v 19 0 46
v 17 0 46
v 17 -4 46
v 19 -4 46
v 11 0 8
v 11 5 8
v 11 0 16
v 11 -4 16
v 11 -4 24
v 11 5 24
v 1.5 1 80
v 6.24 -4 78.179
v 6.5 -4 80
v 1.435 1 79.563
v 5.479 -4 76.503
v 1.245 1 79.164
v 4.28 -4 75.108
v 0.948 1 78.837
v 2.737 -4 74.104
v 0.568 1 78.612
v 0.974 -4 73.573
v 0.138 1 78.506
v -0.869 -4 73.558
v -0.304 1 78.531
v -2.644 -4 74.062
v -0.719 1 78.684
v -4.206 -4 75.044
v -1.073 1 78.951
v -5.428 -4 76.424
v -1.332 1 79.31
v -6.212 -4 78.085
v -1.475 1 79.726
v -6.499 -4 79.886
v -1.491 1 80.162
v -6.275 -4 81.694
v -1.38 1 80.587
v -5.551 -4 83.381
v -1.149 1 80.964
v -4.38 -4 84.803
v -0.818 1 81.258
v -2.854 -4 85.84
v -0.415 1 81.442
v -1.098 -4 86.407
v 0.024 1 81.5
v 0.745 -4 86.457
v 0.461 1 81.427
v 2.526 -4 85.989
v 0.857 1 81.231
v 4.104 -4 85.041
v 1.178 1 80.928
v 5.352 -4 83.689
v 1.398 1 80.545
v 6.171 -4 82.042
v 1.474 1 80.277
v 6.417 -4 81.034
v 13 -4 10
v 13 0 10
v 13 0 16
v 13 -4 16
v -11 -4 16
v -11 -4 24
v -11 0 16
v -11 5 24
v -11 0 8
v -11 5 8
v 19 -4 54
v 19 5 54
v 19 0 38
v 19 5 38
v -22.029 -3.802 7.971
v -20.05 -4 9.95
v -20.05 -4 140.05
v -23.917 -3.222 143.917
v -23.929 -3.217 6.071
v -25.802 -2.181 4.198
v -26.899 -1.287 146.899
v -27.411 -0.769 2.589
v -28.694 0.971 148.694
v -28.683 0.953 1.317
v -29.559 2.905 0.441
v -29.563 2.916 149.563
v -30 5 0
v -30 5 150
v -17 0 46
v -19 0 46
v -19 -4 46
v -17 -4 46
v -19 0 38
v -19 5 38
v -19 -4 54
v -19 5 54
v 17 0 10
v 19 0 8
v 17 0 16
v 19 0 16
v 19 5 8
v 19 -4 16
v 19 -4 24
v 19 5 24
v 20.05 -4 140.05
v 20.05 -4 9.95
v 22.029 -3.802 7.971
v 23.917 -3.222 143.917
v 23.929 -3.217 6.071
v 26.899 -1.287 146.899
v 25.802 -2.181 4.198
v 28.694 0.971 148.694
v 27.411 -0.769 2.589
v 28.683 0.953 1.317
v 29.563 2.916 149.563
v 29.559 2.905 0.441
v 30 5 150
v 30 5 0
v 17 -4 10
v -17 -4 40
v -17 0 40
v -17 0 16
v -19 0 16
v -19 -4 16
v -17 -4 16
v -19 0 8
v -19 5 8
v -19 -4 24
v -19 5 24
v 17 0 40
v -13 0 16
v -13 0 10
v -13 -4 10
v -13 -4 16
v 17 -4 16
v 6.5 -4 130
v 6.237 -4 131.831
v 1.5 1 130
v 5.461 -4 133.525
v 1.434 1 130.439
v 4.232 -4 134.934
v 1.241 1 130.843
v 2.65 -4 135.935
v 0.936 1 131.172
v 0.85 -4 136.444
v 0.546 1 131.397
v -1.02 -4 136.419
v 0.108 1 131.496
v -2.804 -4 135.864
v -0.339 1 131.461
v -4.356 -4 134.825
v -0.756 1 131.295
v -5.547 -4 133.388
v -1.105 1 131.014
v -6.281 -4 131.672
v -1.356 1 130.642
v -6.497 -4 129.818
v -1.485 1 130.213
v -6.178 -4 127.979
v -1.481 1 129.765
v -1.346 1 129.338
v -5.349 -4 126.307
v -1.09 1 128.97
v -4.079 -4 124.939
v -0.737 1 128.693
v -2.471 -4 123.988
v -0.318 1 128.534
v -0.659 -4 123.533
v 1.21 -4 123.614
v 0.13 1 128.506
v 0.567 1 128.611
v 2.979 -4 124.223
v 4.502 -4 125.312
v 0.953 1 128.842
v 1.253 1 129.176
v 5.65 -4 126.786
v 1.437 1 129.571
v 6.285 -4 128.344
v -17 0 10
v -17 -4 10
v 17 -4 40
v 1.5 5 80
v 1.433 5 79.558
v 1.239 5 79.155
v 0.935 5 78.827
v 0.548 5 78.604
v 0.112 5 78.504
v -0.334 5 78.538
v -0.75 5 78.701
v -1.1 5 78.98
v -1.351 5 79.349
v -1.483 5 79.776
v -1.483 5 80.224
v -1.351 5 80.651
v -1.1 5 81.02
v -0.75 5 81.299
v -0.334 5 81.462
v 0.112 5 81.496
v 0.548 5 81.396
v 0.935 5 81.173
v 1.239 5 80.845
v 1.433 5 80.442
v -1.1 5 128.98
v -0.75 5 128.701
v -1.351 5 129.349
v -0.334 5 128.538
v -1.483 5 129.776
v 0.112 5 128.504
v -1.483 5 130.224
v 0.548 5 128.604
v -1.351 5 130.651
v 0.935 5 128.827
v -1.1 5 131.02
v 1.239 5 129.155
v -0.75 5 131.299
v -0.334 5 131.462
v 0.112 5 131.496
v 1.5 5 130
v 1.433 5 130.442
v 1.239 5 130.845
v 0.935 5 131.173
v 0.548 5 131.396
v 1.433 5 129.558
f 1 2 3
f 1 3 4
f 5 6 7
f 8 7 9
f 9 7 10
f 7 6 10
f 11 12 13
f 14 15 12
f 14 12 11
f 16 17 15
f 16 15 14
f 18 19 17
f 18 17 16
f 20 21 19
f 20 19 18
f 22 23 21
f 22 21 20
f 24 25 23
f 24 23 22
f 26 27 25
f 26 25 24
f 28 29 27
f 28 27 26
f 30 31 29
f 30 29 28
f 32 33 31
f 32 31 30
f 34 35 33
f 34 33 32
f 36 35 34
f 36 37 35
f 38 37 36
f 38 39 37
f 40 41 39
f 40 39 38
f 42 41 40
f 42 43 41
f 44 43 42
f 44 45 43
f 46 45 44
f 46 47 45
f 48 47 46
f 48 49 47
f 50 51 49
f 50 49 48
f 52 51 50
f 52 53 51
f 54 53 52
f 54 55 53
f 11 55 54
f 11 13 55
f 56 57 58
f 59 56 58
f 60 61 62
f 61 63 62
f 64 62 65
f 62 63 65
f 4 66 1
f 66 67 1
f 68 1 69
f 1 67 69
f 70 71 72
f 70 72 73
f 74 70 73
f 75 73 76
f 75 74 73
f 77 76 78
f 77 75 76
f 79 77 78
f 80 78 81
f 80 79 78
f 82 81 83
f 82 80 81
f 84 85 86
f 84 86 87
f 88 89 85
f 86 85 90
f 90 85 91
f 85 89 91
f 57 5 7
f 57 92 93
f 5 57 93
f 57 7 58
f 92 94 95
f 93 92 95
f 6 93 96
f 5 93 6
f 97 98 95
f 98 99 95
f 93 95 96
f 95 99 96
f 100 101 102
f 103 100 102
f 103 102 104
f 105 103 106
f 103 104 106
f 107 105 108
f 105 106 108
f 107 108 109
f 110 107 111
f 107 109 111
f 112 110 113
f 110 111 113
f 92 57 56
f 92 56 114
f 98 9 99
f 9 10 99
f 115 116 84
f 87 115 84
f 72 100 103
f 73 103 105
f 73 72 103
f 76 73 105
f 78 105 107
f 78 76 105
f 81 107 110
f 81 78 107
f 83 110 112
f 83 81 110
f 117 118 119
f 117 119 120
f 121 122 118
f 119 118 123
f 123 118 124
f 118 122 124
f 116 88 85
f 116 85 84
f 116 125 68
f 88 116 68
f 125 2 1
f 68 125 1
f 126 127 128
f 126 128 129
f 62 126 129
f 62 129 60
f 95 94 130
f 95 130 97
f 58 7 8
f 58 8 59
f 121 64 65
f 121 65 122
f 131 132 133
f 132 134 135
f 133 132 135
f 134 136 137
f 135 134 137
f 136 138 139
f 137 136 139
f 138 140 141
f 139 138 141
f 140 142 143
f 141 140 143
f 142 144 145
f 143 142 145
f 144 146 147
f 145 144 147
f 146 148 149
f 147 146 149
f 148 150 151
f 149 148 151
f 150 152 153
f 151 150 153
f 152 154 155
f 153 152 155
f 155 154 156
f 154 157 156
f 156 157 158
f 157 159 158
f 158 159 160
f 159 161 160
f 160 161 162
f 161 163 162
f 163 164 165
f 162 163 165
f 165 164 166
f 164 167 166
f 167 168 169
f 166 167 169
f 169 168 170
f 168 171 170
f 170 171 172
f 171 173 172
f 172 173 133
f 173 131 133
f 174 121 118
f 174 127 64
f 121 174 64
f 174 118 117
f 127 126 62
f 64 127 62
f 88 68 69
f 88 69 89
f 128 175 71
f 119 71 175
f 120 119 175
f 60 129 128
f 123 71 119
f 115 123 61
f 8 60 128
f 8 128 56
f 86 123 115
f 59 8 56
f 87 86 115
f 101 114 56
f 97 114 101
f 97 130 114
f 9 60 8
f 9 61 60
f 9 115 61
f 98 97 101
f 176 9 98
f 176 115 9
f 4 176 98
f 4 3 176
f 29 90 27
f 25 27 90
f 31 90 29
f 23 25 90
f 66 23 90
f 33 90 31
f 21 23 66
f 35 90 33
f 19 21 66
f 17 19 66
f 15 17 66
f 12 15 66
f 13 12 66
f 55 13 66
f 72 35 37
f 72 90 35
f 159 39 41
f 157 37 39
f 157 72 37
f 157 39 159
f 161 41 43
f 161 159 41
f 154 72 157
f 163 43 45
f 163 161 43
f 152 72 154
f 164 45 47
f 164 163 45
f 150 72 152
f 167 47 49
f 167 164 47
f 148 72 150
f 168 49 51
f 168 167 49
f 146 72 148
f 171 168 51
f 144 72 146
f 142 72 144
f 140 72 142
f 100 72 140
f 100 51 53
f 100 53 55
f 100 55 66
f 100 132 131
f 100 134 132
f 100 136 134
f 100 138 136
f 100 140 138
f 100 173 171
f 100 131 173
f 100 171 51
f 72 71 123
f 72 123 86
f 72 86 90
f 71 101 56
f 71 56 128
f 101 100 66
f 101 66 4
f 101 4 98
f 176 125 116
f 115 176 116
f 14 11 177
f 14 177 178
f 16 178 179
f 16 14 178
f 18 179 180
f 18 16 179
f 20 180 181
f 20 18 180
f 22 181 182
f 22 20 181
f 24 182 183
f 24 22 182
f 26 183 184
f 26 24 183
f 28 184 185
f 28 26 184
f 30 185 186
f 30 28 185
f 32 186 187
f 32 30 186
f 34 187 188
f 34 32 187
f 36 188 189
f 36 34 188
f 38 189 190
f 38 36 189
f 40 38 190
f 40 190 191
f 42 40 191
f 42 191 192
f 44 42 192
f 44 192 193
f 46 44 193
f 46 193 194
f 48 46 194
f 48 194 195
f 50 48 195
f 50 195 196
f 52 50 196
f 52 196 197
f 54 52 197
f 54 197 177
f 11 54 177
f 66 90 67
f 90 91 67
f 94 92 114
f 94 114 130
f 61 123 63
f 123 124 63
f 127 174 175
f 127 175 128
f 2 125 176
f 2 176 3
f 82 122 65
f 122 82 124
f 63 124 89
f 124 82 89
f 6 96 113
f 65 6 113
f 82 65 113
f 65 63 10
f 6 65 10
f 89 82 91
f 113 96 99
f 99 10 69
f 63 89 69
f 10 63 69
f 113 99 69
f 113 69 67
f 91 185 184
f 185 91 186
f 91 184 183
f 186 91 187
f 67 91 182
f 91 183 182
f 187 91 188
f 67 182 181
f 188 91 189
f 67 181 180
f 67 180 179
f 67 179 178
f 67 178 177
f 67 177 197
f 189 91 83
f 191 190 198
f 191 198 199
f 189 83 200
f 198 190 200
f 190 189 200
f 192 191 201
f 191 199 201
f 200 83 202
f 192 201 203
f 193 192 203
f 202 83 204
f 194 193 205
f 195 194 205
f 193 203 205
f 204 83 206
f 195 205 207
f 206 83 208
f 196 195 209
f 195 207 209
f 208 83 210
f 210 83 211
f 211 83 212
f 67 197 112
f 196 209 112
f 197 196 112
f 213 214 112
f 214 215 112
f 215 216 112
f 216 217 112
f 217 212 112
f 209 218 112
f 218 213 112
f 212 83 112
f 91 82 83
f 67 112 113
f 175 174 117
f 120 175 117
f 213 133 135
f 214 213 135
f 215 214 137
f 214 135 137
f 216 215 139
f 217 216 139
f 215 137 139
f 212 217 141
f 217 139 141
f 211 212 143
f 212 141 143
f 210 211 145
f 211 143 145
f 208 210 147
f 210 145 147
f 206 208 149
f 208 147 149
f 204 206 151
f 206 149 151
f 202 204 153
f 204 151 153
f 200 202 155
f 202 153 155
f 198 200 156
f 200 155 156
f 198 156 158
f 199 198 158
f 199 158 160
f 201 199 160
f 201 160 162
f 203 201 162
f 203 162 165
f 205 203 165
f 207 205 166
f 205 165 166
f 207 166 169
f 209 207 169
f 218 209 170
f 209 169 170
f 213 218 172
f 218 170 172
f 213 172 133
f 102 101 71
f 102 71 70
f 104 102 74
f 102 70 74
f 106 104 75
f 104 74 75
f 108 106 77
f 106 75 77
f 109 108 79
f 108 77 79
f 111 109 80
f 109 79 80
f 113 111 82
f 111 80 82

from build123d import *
from build123d import SkipClean  # not in build123d's __all__

# Parameters (mm, degrees)
F0_R        = 1.5
F1_DEPTH    = 5
F0_W        = 22
F0_H        = 2
F0_W_2      = 2
F0_H_2      = 6
F0_W_3      = 4
F2_DEPTH    = 4
F3_SIZE     = 5
F4_T1_DEPTH = 109.7493718553
F4_T3_DEPTH = 199.7493718553


# Not quite as in the source:
# - a fillet or chamfer that OpenCascade refuses, or shapes differently, is made with other operations: its cross-section is extruded or revolved along the edge and cut away or added
# - a feature names something its author has since deleted; it is built from what else it names


with BuildPart() as f1:
    # F0 (on Front) → F1 (new body)
    with BuildSketch(Plane.XZ):
        with BuildLine():
            Line((-30, 150), (-30, 80))
            Line((-30, 80), (-1.5, 80))
            ThreePointArc((-1.5, 80), (0, 81.5), (1.5, 80))
            Line((1.5, 80), (30, 80))
            Line((30, 80), (30, 150))
            Line((30, 150), (-30, 150))
        make_face()
        with Locations((0, 130)):
            Circle(F0_R, mode=Mode.SUBTRACT)
        with BuildLine():
            Line((-30, 0), (0, 0))
            Line((0, 0), (30, 0))
            Line((30, 0), (30, 80))
            Line((30, 80), (1.5, 80))
            ThreePointArc((1.5, 80), (0, 78.5), (-1.5, 80))
            Line((-1.5, 80), (-30, 80))
            Line((-30, 80), (-30, 0))
        make_face()
        Polygon((-11, 24), (-11, 16), (-11, 10), (-11, 8), (-13, 8), (-17, 8), (-19, 8), (-19, 10), (-19, 16), (-19, 24), align=None, mode=Mode.SUBTRACT)
        Polygon((19, 24), (19, 16), (19, 10), (19, 8), (17, 8), (13, 8), (11, 8), (11, 10), (11, 16), (11, 24), align=None, mode=Mode.SUBTRACT)
        Polygon((-19, 54), (-11, 54), (11, 54), (19, 54), (19, 46), (19, 40), (19, 38), (17, 38), (13, 38), (11, 38), (-11, 38), (-13, 38), (-17, 38), (-19, 38), (-19, 40), (-19, 46), (-19, 48), align=None, mode=Mode.SUBTRACT)
    extrude(amount=-F1_DEPTH)

    # F0 (on Front) → F2 (join)
    with BuildSketch(Plane.XZ):
        with BuildLine():
            Line((-30, 0), (0, 0))
            Line((0, 0), (30, 0))
            Line((30, 0), (30, 80))
            Line((30, 80), (1.5, 80))
            ThreePointArc((1.5, 80), (0, 78.5), (-1.5, 80))
            Line((-1.5, 80), (-30, 80))
            Line((-30, 80), (-30, 0))
        make_face()
        Polygon((-11, 24), (-11, 16), (-11, 10), (-11, 8), (-13, 8), (-17, 8), (-19, 8), (-19, 10), (-19, 16), (-19, 24), align=None, mode=Mode.SUBTRACT)
        Polygon((19, 24), (19, 16), (19, 10), (19, 8), (17, 8), (13, 8), (11, 8), (11, 10), (11, 16), (11, 24), align=None, mode=Mode.SUBTRACT)
        Polygon((-19, 54), (-11, 54), (11, 54), (19, 54), (19, 46), (19, 40), (19, 38), (17, 38), (13, 38), (11, 38), (-11, 38), (-13, 38), (-17, 38), (-19, 38), (-19, 40), (-19, 46), (-19, 48), align=None, mode=Mode.SUBTRACT)
        with BuildLine():
            Line((-30, 150), (-30, 80))
            Line((-30, 80), (-1.5, 80))
            ThreePointArc((-1.5, 80), (0, 81.5), (1.5, 80))
            Line((1.5, 80), (30, 80))
            Line((30, 80), (30, 150))
            Line((30, 150), (-30, 150))
        make_face()
        with Locations((0, 130)):
            Circle(F0_R, mode=Mode.SUBTRACT)
        with Locations((0, 39)):
            Rectangle(F0_W, F0_H)
        with Locations((-18, 43)):
            Rectangle(F0_W_2, F0_H_2)
        with Locations((18, 43)):
            Rectangle(F0_W_2, F0_H_2)
        with Locations((-18, 13)):
            Rectangle(F0_W_2, F0_H_2)
        with Locations((-12, 13)):
            Rectangle(F0_W_2, F0_H_2)
        with Locations((12, 13)):
            Rectangle(F0_W_2, F0_H_2)
        with Locations((18, 13)):
            Rectangle(F0_W_2, F0_H_2)
        with Locations((-15, 39)):
            Rectangle(F0_W_3, F0_H)
        with Locations((15, 39)):
            Rectangle(F0_W_3, F0_H)
        with Locations((-15, 9)):
            Rectangle(F0_W_3, F0_H)
        with Locations((15, 9)):
            Rectangle(F0_W_3, F0_H)
        with Locations((-18, 39)):
            Rectangle(F0_W_2, F0_H)
        with Locations((-12, 39)):
            Rectangle(F0_W_2, F0_H)
        with Locations((12, 39)):
            Rectangle(F0_W_2, F0_H)
        with Locations((18, 39)):
            Rectangle(F0_W_2, F0_H)
        with Locations((-18, 9)):
            Rectangle(F0_W_2, F0_H)
        with Locations((-12, 9)):
            Rectangle(F0_W_2, F0_H)
        with Locations((12, 9)):
            Rectangle(F0_W_2, F0_H)
        with Locations((18, 9)):
            Rectangle(F0_W_2, F0_H)
    with SkipClean():  # cleaning this boolean's faces spoils the solid; the shape is the same uncleaned
        extrude(amount=F2_DEPTH)

    # F3
    f3_edges = [f1.edges().sort_by_distance(p)[0] for p in [
        (-1.5, -4, 130),
        (1.5, -4, 80),
    ]]
    chamfer(f3_edges, length=F3_SIZE)

    # F4: fillet of radius 10 on 4 edges, made by hand

    # F4_s2 → F4_t1 (cut)
    with BuildSketch(Plane.YZ.offset(-54.8746859277)):
        with BuildLine():
            ThreePointArc((-4, 9.9498743711), (-1.4161984871, 3.2416704386), (5, 0))
            Line((5, 0), (-4, 0))
            Line((-4, 0), (-4, 9.9498743711))
        make_face()
        with BuildLine():
            ThreePointArc((-4, 140.0501256289), (-1.4161984871, 146.7583295614), (5, 150))
            Line((5, 150), (-4, 150))
            Line((-4, 150), (-4, 140.0501256289))
        make_face()
    extrude(amount=F4_T1_DEPTH, mode=Mode.SUBTRACT)

    # F4_s4 → F4_t3 (cut)
    with BuildSketch(Plane.XY.offset(-24.8746859277)):
        with BuildLine():
            ThreePointArc((-20.0501256289, -4), (-26.7583295614, -1.4161984871), (-30, 5))
            Line((-30, 5), (-30, -4))
            Line((-30, -4), (-20.0501256289, -4))
        make_face()
        with BuildLine():
            ThreePointArc((20.0501256289, -4), (26.7583295614, -1.4161984871), (30, 5))
            Line((30, 5), (30, -4))
            Line((30, -4), (20.0501256289, -4))
        make_face()
    extrude(amount=F4_T3_DEPTH, mode=Mode.SUBTRACT)


solid = f1.part
